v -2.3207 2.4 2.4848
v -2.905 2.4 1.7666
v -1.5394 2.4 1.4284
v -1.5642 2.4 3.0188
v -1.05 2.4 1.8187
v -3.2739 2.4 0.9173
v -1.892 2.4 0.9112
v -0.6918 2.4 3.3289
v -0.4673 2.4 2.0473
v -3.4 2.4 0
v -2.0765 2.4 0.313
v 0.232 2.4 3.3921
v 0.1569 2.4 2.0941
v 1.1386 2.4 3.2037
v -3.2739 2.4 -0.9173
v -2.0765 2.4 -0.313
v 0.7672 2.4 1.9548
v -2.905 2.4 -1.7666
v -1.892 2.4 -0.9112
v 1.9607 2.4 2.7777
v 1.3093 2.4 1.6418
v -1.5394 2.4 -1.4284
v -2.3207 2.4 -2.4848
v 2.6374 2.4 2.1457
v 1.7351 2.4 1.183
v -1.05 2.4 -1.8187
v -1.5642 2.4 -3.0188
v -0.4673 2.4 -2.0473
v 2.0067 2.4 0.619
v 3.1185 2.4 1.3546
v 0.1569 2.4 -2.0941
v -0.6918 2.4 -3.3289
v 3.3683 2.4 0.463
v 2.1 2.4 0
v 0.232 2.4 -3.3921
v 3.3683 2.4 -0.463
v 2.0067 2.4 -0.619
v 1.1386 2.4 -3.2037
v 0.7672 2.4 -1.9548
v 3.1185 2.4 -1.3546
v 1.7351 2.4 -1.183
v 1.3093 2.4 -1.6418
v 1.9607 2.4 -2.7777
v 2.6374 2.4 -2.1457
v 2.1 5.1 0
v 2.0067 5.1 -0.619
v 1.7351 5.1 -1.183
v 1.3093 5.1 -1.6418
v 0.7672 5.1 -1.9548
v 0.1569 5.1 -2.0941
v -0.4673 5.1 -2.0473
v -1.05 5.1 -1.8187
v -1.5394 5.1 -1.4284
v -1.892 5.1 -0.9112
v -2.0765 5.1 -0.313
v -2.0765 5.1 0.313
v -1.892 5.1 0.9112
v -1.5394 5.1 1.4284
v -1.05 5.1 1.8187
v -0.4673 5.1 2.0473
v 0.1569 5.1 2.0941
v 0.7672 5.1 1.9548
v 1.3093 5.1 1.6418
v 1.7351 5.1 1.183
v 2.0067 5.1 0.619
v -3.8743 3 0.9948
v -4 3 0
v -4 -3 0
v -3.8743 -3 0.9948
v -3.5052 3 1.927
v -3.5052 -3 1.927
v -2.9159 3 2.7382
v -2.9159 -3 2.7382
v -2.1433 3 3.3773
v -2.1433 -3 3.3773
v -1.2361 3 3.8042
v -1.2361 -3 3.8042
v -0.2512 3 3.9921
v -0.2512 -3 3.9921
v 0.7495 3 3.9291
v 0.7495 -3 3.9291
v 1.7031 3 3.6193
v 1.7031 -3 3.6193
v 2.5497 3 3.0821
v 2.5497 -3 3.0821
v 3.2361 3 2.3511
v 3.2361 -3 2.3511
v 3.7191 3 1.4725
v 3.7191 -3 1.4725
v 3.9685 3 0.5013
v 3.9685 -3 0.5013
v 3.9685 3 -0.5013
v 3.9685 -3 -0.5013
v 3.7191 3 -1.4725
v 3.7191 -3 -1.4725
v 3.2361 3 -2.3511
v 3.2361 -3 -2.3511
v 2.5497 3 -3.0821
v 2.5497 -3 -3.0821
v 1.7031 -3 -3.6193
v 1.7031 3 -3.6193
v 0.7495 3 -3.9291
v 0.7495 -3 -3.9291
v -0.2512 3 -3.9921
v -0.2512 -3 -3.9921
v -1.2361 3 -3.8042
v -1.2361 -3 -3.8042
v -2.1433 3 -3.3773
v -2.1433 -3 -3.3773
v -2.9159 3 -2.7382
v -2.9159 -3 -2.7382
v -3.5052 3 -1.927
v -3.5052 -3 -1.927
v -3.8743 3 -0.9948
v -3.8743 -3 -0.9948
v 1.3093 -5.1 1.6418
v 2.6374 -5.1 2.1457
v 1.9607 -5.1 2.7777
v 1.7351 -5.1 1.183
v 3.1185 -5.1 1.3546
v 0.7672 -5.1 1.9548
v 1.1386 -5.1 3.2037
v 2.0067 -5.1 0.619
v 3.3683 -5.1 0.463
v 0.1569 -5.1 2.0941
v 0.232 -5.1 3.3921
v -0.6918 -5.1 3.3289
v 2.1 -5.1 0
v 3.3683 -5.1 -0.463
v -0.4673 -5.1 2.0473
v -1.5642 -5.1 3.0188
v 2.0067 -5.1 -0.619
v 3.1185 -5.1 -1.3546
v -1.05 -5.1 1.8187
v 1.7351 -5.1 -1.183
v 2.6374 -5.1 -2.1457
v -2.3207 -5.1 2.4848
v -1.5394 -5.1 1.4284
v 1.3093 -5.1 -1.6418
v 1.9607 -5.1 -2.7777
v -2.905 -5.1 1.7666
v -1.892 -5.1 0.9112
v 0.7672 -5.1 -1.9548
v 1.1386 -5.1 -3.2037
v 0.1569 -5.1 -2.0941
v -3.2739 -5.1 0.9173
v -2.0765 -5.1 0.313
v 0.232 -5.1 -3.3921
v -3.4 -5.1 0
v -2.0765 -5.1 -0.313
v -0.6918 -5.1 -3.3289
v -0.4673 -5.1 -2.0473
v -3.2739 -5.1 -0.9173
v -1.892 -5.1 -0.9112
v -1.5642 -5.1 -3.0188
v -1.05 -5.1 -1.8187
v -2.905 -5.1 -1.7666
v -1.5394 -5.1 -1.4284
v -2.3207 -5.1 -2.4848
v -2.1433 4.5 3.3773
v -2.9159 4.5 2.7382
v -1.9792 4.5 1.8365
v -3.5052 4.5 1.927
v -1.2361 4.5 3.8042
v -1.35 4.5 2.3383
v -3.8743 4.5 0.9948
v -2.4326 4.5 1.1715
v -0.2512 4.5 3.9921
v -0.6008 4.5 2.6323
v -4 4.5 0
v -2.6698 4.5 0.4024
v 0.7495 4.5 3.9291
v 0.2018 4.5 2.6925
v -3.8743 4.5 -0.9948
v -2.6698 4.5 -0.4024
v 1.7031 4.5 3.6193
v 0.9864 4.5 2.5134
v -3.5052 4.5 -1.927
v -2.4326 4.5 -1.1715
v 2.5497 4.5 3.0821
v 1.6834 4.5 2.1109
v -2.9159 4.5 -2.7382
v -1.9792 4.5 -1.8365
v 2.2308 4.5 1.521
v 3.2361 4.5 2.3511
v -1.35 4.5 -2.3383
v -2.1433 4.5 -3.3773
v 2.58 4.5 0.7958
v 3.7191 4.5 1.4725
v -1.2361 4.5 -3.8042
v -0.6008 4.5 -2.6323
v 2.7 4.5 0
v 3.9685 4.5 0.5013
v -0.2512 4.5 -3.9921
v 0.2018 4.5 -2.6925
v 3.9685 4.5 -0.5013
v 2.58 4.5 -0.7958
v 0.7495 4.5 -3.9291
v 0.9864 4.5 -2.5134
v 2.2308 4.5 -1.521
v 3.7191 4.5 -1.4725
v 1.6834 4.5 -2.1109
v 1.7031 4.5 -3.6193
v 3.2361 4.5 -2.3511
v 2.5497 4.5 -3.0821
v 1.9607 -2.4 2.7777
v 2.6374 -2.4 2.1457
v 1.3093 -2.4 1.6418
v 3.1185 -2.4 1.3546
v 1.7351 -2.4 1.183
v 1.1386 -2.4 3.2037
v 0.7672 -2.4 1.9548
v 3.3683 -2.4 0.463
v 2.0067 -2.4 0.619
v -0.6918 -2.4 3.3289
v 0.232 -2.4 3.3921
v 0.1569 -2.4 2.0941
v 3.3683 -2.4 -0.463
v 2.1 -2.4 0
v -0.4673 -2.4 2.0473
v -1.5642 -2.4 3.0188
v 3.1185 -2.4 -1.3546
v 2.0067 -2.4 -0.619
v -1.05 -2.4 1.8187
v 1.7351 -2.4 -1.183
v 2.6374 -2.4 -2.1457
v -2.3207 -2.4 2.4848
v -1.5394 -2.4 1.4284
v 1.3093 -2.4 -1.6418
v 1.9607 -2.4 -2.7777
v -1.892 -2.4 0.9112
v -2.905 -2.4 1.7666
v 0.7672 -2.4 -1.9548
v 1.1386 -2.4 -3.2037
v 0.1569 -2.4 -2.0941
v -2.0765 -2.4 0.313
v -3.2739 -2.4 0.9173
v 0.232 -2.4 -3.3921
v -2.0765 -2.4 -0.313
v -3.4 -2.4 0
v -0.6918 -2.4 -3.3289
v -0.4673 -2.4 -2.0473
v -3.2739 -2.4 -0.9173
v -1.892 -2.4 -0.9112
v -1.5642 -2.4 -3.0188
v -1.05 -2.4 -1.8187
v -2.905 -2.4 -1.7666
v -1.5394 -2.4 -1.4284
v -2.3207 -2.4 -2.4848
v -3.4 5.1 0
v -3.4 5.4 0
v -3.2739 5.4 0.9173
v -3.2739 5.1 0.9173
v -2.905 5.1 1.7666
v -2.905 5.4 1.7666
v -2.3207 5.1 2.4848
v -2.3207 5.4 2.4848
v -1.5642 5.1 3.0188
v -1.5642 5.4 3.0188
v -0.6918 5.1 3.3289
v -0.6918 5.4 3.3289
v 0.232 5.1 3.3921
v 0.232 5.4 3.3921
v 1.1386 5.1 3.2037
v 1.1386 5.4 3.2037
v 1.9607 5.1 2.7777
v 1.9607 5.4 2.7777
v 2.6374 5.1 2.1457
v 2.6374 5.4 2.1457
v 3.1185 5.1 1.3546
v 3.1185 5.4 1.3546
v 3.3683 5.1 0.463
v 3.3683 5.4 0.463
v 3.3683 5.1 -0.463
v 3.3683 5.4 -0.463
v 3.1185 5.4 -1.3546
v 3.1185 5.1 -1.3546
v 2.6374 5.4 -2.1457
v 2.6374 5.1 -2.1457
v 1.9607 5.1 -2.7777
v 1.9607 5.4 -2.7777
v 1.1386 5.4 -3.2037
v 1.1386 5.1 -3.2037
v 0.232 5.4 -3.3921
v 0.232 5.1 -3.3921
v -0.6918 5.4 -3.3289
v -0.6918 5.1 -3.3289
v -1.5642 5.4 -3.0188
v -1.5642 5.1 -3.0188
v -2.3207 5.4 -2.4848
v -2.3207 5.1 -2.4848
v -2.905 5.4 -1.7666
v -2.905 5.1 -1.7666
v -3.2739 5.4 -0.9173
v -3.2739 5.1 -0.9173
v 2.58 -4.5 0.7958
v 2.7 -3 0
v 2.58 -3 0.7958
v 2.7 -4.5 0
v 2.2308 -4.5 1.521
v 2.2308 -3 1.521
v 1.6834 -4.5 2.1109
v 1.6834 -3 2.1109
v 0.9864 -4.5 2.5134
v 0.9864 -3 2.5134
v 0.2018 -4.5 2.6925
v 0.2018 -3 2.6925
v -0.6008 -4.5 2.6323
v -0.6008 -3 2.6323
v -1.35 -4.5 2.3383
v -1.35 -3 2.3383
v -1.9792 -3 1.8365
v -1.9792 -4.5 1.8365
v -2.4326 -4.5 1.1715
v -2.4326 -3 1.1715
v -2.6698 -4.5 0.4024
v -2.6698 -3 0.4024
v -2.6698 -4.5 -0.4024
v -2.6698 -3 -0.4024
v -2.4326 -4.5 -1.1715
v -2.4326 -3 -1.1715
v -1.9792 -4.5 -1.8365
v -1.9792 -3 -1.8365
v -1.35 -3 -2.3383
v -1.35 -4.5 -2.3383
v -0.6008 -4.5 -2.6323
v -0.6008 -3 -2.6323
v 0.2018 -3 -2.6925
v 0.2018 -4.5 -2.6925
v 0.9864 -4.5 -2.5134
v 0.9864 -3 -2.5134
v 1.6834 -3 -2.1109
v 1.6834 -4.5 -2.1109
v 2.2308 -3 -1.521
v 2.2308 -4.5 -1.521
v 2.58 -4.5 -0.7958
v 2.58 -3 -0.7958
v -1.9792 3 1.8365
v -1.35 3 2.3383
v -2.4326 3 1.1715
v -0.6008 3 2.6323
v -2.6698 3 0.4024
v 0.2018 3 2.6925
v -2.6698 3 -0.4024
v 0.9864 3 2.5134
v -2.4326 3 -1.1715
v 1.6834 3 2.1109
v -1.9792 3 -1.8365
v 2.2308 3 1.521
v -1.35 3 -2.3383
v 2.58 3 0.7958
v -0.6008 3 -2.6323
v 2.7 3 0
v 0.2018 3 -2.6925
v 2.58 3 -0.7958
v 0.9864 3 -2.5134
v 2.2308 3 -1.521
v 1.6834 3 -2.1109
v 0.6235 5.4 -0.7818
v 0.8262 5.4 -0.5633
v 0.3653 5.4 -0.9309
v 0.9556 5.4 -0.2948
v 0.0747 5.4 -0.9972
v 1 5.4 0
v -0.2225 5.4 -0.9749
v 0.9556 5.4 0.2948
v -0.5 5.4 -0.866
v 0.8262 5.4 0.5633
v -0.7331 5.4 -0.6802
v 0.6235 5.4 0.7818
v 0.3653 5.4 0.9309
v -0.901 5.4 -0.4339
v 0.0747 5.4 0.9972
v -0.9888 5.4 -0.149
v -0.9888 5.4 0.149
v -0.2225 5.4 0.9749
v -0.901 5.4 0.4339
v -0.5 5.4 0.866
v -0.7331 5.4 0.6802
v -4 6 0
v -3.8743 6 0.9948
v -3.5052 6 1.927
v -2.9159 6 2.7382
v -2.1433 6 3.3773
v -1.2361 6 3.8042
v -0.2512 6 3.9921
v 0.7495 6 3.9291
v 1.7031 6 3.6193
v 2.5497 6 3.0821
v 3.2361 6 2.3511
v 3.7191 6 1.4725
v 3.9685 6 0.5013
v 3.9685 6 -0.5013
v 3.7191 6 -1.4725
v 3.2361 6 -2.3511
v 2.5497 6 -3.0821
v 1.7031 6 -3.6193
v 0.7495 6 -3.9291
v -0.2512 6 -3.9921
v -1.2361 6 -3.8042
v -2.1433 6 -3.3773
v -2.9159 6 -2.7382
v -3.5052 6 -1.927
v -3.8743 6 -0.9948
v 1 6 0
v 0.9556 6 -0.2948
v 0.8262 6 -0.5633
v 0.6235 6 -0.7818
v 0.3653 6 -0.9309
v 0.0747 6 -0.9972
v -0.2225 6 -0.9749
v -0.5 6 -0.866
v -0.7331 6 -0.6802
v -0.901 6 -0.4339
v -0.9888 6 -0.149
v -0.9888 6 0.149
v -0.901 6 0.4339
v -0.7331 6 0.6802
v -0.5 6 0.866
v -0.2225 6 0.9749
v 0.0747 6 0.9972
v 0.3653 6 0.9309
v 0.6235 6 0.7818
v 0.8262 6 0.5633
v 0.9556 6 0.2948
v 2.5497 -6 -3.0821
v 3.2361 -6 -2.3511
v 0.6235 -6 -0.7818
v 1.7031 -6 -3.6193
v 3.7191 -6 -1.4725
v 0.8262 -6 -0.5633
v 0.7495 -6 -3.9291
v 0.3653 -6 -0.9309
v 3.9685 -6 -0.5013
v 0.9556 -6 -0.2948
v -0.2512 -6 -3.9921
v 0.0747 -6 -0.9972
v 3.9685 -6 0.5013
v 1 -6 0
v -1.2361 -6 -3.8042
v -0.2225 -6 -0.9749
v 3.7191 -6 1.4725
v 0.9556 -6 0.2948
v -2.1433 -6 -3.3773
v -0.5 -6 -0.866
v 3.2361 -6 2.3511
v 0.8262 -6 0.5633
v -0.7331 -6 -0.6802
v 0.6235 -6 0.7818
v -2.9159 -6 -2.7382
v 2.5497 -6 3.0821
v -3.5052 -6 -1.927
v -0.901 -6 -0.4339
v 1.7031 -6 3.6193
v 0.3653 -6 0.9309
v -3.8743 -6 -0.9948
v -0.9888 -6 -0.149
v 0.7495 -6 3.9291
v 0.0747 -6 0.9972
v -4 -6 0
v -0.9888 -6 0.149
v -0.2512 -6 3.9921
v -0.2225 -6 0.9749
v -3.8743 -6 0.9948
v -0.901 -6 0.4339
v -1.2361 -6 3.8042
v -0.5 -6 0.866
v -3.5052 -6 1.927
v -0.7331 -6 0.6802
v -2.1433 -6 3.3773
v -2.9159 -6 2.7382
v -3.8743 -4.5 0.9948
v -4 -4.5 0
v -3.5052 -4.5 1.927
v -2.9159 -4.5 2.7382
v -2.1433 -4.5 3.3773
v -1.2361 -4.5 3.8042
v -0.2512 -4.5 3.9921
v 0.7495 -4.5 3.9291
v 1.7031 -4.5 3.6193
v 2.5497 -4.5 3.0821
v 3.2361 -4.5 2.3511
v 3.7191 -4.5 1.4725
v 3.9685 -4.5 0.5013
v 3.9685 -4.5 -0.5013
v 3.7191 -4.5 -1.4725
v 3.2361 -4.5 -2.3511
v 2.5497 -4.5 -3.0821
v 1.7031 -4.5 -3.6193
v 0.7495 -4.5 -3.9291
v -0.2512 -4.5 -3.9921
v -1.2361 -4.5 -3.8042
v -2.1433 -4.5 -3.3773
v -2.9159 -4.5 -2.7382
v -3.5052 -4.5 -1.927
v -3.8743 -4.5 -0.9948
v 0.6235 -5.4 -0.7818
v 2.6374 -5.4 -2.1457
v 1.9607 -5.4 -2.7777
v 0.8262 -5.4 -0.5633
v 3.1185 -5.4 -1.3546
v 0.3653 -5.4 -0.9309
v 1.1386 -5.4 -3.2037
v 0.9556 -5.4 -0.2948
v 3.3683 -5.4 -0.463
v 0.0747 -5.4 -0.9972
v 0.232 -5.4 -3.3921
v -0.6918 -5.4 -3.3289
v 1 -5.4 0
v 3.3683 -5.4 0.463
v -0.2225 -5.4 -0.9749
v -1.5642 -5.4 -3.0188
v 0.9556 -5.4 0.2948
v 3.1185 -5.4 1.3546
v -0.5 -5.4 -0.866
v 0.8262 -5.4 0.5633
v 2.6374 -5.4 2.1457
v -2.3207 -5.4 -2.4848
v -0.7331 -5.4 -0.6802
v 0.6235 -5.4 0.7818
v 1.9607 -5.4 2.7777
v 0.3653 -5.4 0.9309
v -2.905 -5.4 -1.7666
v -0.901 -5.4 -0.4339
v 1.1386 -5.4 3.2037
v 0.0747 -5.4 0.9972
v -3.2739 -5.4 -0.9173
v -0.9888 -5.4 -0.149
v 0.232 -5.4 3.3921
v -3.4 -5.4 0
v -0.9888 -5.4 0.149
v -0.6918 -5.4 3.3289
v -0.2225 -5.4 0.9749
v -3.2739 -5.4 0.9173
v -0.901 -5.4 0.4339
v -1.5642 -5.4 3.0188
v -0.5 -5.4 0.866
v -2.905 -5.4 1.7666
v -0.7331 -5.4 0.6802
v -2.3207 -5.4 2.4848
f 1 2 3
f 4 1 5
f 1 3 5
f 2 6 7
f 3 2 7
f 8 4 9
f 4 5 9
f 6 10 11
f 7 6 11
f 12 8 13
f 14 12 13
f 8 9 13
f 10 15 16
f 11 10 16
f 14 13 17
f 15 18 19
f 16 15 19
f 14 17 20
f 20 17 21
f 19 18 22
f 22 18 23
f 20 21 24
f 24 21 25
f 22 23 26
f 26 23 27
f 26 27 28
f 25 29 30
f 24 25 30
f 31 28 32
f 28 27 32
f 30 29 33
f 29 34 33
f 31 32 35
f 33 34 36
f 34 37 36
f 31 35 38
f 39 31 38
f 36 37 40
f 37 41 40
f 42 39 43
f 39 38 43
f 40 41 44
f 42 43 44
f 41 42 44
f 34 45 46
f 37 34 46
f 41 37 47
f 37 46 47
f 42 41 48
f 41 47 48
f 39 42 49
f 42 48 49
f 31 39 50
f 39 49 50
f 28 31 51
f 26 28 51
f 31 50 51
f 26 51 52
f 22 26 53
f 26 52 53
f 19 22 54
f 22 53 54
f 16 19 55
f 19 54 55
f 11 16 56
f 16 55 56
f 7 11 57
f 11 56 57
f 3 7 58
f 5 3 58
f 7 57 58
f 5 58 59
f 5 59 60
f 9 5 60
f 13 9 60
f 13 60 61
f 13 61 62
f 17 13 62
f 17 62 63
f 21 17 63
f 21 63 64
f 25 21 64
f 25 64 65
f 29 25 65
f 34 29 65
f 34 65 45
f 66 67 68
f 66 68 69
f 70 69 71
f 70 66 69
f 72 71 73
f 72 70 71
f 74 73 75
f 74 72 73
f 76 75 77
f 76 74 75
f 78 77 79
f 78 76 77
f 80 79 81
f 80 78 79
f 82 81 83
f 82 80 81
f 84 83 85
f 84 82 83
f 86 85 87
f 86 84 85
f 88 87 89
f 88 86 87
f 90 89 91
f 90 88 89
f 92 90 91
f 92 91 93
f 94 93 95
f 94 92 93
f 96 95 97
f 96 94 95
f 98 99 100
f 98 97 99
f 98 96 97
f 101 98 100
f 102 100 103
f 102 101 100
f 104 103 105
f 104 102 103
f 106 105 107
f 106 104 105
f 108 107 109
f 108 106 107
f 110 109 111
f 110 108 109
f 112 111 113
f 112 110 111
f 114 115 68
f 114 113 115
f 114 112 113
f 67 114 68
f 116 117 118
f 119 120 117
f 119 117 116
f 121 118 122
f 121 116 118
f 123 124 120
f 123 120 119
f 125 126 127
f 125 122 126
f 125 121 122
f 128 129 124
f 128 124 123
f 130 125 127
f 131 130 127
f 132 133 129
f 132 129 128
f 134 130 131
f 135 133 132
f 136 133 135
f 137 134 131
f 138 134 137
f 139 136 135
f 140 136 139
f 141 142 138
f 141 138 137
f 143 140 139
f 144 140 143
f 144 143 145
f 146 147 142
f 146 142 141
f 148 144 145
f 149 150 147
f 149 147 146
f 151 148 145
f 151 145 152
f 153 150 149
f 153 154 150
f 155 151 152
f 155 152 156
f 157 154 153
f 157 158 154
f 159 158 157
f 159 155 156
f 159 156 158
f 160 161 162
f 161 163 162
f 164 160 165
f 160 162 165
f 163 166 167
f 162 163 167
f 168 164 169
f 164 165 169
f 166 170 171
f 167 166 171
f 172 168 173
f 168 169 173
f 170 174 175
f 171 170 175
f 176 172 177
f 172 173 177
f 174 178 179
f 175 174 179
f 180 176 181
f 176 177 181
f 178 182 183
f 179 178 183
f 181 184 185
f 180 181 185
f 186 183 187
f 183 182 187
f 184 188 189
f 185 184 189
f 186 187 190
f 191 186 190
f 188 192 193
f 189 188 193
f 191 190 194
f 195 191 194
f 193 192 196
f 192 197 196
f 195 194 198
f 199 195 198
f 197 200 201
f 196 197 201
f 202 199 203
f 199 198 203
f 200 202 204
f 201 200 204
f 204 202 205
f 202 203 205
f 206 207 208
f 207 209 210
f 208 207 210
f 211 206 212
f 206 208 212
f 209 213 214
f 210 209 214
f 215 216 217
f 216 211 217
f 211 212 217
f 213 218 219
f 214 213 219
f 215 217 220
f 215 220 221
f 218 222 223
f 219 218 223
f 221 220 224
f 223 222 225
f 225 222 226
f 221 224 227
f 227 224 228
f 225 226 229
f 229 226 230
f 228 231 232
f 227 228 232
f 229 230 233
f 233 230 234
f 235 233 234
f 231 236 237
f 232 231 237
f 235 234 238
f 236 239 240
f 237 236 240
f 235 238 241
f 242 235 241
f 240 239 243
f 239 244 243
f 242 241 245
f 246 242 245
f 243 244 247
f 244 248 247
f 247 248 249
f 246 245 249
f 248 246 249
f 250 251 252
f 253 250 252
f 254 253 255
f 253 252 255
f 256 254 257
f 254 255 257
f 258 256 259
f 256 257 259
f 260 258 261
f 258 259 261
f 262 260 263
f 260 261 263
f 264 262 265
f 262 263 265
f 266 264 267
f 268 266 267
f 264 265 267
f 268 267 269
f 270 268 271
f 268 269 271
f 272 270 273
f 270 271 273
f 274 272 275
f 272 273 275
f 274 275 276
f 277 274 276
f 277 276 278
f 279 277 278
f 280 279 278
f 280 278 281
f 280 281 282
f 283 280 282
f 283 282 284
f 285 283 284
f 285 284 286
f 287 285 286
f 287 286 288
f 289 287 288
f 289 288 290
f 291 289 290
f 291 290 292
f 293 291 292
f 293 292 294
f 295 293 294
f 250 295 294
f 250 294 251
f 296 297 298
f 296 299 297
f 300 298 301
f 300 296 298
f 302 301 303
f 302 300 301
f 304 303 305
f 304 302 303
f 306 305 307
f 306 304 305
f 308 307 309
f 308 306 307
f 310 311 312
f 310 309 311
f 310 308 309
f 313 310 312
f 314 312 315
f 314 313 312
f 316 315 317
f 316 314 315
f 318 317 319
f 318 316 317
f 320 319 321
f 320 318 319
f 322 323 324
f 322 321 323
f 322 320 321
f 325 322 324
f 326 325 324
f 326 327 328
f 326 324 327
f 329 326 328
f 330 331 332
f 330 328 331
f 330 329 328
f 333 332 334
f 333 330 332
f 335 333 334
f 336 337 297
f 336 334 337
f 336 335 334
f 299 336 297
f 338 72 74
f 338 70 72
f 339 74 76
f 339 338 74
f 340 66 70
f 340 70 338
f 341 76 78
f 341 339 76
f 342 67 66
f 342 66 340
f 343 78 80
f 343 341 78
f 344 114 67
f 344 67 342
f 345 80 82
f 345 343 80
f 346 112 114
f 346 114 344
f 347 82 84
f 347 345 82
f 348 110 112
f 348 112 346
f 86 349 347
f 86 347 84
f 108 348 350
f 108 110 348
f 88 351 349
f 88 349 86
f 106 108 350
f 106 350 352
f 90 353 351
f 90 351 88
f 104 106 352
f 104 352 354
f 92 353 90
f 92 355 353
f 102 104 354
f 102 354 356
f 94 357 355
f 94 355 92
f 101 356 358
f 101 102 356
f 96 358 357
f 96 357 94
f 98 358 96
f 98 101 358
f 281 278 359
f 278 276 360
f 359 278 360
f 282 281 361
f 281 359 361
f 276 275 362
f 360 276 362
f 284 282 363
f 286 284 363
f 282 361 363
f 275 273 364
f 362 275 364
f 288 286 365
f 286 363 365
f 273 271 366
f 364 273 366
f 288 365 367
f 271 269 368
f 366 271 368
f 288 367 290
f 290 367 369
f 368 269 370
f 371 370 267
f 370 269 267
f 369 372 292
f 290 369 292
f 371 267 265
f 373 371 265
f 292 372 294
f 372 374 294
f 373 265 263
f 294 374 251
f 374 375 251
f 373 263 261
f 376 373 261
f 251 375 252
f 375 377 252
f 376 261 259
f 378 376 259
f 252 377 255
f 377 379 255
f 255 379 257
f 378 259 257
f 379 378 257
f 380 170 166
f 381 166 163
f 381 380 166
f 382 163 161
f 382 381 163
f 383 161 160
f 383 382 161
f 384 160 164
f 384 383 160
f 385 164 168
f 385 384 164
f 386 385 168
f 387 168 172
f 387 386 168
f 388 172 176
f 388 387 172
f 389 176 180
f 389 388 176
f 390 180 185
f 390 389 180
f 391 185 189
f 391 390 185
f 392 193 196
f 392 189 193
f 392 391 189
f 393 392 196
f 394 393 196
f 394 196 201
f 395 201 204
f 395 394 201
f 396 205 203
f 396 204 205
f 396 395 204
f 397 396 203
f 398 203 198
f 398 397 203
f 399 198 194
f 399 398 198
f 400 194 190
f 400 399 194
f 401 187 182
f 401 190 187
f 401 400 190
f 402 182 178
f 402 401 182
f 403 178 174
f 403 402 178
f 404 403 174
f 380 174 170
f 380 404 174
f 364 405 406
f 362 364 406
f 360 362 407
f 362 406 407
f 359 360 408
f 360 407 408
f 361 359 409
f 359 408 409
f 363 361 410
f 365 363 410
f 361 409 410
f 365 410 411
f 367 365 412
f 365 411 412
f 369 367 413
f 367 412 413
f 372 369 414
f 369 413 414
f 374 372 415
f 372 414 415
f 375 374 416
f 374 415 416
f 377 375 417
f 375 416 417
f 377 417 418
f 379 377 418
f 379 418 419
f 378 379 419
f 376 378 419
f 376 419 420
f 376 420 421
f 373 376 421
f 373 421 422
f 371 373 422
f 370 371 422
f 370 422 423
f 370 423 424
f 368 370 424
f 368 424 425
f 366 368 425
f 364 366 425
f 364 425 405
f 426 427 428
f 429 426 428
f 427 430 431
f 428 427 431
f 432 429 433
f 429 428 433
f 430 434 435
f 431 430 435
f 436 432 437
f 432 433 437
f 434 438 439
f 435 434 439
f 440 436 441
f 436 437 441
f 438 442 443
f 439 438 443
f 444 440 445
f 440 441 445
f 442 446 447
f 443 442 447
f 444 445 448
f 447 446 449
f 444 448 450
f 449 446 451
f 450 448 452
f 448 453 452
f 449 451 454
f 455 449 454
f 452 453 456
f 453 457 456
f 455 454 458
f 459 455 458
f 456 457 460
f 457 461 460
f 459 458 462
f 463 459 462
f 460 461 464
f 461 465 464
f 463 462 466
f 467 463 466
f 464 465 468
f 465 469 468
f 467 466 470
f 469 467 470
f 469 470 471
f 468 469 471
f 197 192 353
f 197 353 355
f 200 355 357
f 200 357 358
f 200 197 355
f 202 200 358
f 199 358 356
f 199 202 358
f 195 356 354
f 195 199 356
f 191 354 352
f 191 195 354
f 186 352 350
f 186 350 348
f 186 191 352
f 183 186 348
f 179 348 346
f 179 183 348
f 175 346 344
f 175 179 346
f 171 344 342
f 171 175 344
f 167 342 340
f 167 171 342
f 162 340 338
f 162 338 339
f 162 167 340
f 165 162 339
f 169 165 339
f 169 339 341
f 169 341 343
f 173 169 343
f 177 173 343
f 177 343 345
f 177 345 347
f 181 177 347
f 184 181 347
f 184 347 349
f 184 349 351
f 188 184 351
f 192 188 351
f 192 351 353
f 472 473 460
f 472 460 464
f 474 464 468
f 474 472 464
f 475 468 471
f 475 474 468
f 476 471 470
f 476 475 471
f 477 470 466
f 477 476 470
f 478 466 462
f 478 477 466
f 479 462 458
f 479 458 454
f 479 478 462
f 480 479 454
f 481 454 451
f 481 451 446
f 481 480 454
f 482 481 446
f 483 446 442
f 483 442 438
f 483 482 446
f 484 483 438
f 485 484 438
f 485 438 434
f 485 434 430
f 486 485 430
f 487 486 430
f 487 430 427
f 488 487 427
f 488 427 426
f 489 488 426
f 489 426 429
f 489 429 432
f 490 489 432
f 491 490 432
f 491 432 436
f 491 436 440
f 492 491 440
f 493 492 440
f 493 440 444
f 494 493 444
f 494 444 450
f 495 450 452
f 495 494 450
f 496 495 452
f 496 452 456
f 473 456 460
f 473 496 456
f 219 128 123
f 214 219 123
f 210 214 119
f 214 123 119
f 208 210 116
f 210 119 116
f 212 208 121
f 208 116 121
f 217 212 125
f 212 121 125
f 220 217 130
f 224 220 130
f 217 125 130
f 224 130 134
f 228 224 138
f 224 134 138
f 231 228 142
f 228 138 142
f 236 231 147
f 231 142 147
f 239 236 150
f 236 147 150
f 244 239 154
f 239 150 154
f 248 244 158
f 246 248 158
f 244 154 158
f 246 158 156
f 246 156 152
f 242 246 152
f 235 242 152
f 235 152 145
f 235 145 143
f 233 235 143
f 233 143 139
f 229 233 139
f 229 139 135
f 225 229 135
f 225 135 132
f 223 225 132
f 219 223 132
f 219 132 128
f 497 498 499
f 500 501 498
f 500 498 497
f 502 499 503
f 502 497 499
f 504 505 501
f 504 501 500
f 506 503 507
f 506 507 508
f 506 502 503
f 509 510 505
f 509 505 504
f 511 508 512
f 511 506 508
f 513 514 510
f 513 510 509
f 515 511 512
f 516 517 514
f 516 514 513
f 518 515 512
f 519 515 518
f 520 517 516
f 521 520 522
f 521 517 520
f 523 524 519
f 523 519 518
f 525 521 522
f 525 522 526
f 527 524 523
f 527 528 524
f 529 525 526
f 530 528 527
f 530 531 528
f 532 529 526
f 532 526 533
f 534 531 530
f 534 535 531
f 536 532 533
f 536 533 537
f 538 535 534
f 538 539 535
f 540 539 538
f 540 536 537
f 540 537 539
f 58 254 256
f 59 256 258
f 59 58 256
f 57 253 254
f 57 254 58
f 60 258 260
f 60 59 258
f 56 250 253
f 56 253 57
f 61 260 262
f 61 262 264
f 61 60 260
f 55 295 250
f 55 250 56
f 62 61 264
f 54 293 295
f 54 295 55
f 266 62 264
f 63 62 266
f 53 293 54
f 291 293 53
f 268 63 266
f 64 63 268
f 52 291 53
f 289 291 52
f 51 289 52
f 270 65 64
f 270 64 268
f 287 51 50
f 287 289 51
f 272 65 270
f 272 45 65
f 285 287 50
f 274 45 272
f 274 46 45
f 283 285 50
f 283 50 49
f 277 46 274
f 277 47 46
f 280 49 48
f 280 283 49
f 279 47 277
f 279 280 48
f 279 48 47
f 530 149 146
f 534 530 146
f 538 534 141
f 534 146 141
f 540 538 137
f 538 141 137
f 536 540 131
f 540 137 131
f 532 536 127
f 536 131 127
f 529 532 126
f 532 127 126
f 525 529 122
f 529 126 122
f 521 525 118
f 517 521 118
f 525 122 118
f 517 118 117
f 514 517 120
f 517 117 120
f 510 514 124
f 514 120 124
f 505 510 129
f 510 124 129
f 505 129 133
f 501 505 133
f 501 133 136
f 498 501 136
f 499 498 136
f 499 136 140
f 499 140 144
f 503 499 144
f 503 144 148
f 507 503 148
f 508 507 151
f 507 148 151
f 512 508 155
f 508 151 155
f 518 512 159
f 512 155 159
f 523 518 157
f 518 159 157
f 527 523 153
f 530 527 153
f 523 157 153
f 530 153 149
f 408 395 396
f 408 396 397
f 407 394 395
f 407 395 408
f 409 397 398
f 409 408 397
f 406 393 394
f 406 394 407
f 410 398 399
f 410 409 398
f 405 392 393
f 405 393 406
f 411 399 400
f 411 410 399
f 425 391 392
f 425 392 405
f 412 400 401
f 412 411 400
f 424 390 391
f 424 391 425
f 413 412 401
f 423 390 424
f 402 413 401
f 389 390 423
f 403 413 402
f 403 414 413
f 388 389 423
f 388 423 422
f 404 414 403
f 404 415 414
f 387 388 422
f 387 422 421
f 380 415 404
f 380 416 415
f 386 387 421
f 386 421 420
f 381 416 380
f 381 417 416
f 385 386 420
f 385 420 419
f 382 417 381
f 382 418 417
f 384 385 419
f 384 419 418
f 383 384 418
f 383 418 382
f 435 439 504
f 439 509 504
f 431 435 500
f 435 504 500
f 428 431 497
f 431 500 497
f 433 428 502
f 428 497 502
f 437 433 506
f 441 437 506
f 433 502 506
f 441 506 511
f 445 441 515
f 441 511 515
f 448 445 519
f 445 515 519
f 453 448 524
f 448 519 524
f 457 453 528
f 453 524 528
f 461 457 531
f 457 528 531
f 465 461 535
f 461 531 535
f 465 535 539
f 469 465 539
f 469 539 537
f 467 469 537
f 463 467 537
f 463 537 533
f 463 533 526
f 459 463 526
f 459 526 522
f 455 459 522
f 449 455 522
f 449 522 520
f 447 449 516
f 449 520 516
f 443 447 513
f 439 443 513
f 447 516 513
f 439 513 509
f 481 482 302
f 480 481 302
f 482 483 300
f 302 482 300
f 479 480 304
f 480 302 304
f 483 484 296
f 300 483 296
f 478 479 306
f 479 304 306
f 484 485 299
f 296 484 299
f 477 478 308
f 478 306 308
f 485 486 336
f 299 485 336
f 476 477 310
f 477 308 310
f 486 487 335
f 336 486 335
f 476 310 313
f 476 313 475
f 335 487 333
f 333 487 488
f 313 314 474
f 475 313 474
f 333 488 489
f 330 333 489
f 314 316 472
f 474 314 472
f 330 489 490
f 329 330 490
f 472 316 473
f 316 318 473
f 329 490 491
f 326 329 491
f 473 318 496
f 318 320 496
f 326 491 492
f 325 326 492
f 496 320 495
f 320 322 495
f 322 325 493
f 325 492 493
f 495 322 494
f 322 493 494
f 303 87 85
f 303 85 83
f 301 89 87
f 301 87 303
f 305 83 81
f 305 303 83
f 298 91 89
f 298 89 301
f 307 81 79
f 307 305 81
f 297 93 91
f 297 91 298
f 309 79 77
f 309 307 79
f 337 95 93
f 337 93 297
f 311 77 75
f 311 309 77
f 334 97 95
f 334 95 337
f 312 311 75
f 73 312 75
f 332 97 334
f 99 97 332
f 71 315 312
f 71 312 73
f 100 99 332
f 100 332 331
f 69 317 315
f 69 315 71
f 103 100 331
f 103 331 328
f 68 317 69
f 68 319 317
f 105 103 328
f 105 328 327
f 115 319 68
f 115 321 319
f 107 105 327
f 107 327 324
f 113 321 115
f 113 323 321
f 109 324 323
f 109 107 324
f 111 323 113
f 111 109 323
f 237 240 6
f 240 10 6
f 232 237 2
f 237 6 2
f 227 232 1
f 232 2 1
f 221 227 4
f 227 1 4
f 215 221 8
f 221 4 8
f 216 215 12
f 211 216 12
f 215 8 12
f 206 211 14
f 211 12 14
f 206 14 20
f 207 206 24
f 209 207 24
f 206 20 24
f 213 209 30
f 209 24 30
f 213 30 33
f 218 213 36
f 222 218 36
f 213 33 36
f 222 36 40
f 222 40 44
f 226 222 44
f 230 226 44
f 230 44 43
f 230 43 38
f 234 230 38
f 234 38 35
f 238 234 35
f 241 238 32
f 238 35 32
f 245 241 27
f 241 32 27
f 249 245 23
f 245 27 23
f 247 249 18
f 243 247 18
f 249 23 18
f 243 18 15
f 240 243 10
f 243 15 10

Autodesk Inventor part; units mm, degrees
ref_plane "YZ Plane" through (0, 0, 0) normal (1, 0, 0) x (0, 1, 0)
ref_plane "XZ Plane" through (0, 0, 0) normal (0, 1, 0) x (-1, 0, 0)
sketch "Boceto1" plane through (0, 0, 0) normal (0, 1, 0) x (-1, 0, 0)
  circle A0 centre (0, 0) radius 4
  circle A1 centre (0, 0) radius 1
  dimension "d0" = 8
  dimension "d7" = 2
extrude "Extrusión1" add sketch "Boceto1" along normal mid plane 12 contours A0 | A1
ref_plane "Plano de trabajo1" through (0, 4.5, 0) normal (0, 1, 0) x (1, 0, 0)
sketch "Boceto2" plane through (0, 4.5, 0) normal (0, 1, 0) x (1, 0, 0)
  circle A0 centre (0, 0) radius 4 projected
  circle A1 centre (0, 0) radius 2.7
  dimension "d4" = 5.4
extrude "Extrusión2" cut sketch "Boceto2" against normal blind 1.5
mirror "Simetría1" about plane through (0, 0, 0) normal (0, 1, 0) of "Extrusión2"
shell "Vaciado2" thickness 0.6 removed faces 0
sketch "Boceto4" plane through (0, 6, 0) normal (0, 1, 0) x (1, 0, 0)
  circle A0 centre (0, 0) radius 1
  dimension "d14" = 2
extrude "Extrusión4" cut sketch "Boceto4" against normal through all
properties part number "antivibracion_3DPrint"
